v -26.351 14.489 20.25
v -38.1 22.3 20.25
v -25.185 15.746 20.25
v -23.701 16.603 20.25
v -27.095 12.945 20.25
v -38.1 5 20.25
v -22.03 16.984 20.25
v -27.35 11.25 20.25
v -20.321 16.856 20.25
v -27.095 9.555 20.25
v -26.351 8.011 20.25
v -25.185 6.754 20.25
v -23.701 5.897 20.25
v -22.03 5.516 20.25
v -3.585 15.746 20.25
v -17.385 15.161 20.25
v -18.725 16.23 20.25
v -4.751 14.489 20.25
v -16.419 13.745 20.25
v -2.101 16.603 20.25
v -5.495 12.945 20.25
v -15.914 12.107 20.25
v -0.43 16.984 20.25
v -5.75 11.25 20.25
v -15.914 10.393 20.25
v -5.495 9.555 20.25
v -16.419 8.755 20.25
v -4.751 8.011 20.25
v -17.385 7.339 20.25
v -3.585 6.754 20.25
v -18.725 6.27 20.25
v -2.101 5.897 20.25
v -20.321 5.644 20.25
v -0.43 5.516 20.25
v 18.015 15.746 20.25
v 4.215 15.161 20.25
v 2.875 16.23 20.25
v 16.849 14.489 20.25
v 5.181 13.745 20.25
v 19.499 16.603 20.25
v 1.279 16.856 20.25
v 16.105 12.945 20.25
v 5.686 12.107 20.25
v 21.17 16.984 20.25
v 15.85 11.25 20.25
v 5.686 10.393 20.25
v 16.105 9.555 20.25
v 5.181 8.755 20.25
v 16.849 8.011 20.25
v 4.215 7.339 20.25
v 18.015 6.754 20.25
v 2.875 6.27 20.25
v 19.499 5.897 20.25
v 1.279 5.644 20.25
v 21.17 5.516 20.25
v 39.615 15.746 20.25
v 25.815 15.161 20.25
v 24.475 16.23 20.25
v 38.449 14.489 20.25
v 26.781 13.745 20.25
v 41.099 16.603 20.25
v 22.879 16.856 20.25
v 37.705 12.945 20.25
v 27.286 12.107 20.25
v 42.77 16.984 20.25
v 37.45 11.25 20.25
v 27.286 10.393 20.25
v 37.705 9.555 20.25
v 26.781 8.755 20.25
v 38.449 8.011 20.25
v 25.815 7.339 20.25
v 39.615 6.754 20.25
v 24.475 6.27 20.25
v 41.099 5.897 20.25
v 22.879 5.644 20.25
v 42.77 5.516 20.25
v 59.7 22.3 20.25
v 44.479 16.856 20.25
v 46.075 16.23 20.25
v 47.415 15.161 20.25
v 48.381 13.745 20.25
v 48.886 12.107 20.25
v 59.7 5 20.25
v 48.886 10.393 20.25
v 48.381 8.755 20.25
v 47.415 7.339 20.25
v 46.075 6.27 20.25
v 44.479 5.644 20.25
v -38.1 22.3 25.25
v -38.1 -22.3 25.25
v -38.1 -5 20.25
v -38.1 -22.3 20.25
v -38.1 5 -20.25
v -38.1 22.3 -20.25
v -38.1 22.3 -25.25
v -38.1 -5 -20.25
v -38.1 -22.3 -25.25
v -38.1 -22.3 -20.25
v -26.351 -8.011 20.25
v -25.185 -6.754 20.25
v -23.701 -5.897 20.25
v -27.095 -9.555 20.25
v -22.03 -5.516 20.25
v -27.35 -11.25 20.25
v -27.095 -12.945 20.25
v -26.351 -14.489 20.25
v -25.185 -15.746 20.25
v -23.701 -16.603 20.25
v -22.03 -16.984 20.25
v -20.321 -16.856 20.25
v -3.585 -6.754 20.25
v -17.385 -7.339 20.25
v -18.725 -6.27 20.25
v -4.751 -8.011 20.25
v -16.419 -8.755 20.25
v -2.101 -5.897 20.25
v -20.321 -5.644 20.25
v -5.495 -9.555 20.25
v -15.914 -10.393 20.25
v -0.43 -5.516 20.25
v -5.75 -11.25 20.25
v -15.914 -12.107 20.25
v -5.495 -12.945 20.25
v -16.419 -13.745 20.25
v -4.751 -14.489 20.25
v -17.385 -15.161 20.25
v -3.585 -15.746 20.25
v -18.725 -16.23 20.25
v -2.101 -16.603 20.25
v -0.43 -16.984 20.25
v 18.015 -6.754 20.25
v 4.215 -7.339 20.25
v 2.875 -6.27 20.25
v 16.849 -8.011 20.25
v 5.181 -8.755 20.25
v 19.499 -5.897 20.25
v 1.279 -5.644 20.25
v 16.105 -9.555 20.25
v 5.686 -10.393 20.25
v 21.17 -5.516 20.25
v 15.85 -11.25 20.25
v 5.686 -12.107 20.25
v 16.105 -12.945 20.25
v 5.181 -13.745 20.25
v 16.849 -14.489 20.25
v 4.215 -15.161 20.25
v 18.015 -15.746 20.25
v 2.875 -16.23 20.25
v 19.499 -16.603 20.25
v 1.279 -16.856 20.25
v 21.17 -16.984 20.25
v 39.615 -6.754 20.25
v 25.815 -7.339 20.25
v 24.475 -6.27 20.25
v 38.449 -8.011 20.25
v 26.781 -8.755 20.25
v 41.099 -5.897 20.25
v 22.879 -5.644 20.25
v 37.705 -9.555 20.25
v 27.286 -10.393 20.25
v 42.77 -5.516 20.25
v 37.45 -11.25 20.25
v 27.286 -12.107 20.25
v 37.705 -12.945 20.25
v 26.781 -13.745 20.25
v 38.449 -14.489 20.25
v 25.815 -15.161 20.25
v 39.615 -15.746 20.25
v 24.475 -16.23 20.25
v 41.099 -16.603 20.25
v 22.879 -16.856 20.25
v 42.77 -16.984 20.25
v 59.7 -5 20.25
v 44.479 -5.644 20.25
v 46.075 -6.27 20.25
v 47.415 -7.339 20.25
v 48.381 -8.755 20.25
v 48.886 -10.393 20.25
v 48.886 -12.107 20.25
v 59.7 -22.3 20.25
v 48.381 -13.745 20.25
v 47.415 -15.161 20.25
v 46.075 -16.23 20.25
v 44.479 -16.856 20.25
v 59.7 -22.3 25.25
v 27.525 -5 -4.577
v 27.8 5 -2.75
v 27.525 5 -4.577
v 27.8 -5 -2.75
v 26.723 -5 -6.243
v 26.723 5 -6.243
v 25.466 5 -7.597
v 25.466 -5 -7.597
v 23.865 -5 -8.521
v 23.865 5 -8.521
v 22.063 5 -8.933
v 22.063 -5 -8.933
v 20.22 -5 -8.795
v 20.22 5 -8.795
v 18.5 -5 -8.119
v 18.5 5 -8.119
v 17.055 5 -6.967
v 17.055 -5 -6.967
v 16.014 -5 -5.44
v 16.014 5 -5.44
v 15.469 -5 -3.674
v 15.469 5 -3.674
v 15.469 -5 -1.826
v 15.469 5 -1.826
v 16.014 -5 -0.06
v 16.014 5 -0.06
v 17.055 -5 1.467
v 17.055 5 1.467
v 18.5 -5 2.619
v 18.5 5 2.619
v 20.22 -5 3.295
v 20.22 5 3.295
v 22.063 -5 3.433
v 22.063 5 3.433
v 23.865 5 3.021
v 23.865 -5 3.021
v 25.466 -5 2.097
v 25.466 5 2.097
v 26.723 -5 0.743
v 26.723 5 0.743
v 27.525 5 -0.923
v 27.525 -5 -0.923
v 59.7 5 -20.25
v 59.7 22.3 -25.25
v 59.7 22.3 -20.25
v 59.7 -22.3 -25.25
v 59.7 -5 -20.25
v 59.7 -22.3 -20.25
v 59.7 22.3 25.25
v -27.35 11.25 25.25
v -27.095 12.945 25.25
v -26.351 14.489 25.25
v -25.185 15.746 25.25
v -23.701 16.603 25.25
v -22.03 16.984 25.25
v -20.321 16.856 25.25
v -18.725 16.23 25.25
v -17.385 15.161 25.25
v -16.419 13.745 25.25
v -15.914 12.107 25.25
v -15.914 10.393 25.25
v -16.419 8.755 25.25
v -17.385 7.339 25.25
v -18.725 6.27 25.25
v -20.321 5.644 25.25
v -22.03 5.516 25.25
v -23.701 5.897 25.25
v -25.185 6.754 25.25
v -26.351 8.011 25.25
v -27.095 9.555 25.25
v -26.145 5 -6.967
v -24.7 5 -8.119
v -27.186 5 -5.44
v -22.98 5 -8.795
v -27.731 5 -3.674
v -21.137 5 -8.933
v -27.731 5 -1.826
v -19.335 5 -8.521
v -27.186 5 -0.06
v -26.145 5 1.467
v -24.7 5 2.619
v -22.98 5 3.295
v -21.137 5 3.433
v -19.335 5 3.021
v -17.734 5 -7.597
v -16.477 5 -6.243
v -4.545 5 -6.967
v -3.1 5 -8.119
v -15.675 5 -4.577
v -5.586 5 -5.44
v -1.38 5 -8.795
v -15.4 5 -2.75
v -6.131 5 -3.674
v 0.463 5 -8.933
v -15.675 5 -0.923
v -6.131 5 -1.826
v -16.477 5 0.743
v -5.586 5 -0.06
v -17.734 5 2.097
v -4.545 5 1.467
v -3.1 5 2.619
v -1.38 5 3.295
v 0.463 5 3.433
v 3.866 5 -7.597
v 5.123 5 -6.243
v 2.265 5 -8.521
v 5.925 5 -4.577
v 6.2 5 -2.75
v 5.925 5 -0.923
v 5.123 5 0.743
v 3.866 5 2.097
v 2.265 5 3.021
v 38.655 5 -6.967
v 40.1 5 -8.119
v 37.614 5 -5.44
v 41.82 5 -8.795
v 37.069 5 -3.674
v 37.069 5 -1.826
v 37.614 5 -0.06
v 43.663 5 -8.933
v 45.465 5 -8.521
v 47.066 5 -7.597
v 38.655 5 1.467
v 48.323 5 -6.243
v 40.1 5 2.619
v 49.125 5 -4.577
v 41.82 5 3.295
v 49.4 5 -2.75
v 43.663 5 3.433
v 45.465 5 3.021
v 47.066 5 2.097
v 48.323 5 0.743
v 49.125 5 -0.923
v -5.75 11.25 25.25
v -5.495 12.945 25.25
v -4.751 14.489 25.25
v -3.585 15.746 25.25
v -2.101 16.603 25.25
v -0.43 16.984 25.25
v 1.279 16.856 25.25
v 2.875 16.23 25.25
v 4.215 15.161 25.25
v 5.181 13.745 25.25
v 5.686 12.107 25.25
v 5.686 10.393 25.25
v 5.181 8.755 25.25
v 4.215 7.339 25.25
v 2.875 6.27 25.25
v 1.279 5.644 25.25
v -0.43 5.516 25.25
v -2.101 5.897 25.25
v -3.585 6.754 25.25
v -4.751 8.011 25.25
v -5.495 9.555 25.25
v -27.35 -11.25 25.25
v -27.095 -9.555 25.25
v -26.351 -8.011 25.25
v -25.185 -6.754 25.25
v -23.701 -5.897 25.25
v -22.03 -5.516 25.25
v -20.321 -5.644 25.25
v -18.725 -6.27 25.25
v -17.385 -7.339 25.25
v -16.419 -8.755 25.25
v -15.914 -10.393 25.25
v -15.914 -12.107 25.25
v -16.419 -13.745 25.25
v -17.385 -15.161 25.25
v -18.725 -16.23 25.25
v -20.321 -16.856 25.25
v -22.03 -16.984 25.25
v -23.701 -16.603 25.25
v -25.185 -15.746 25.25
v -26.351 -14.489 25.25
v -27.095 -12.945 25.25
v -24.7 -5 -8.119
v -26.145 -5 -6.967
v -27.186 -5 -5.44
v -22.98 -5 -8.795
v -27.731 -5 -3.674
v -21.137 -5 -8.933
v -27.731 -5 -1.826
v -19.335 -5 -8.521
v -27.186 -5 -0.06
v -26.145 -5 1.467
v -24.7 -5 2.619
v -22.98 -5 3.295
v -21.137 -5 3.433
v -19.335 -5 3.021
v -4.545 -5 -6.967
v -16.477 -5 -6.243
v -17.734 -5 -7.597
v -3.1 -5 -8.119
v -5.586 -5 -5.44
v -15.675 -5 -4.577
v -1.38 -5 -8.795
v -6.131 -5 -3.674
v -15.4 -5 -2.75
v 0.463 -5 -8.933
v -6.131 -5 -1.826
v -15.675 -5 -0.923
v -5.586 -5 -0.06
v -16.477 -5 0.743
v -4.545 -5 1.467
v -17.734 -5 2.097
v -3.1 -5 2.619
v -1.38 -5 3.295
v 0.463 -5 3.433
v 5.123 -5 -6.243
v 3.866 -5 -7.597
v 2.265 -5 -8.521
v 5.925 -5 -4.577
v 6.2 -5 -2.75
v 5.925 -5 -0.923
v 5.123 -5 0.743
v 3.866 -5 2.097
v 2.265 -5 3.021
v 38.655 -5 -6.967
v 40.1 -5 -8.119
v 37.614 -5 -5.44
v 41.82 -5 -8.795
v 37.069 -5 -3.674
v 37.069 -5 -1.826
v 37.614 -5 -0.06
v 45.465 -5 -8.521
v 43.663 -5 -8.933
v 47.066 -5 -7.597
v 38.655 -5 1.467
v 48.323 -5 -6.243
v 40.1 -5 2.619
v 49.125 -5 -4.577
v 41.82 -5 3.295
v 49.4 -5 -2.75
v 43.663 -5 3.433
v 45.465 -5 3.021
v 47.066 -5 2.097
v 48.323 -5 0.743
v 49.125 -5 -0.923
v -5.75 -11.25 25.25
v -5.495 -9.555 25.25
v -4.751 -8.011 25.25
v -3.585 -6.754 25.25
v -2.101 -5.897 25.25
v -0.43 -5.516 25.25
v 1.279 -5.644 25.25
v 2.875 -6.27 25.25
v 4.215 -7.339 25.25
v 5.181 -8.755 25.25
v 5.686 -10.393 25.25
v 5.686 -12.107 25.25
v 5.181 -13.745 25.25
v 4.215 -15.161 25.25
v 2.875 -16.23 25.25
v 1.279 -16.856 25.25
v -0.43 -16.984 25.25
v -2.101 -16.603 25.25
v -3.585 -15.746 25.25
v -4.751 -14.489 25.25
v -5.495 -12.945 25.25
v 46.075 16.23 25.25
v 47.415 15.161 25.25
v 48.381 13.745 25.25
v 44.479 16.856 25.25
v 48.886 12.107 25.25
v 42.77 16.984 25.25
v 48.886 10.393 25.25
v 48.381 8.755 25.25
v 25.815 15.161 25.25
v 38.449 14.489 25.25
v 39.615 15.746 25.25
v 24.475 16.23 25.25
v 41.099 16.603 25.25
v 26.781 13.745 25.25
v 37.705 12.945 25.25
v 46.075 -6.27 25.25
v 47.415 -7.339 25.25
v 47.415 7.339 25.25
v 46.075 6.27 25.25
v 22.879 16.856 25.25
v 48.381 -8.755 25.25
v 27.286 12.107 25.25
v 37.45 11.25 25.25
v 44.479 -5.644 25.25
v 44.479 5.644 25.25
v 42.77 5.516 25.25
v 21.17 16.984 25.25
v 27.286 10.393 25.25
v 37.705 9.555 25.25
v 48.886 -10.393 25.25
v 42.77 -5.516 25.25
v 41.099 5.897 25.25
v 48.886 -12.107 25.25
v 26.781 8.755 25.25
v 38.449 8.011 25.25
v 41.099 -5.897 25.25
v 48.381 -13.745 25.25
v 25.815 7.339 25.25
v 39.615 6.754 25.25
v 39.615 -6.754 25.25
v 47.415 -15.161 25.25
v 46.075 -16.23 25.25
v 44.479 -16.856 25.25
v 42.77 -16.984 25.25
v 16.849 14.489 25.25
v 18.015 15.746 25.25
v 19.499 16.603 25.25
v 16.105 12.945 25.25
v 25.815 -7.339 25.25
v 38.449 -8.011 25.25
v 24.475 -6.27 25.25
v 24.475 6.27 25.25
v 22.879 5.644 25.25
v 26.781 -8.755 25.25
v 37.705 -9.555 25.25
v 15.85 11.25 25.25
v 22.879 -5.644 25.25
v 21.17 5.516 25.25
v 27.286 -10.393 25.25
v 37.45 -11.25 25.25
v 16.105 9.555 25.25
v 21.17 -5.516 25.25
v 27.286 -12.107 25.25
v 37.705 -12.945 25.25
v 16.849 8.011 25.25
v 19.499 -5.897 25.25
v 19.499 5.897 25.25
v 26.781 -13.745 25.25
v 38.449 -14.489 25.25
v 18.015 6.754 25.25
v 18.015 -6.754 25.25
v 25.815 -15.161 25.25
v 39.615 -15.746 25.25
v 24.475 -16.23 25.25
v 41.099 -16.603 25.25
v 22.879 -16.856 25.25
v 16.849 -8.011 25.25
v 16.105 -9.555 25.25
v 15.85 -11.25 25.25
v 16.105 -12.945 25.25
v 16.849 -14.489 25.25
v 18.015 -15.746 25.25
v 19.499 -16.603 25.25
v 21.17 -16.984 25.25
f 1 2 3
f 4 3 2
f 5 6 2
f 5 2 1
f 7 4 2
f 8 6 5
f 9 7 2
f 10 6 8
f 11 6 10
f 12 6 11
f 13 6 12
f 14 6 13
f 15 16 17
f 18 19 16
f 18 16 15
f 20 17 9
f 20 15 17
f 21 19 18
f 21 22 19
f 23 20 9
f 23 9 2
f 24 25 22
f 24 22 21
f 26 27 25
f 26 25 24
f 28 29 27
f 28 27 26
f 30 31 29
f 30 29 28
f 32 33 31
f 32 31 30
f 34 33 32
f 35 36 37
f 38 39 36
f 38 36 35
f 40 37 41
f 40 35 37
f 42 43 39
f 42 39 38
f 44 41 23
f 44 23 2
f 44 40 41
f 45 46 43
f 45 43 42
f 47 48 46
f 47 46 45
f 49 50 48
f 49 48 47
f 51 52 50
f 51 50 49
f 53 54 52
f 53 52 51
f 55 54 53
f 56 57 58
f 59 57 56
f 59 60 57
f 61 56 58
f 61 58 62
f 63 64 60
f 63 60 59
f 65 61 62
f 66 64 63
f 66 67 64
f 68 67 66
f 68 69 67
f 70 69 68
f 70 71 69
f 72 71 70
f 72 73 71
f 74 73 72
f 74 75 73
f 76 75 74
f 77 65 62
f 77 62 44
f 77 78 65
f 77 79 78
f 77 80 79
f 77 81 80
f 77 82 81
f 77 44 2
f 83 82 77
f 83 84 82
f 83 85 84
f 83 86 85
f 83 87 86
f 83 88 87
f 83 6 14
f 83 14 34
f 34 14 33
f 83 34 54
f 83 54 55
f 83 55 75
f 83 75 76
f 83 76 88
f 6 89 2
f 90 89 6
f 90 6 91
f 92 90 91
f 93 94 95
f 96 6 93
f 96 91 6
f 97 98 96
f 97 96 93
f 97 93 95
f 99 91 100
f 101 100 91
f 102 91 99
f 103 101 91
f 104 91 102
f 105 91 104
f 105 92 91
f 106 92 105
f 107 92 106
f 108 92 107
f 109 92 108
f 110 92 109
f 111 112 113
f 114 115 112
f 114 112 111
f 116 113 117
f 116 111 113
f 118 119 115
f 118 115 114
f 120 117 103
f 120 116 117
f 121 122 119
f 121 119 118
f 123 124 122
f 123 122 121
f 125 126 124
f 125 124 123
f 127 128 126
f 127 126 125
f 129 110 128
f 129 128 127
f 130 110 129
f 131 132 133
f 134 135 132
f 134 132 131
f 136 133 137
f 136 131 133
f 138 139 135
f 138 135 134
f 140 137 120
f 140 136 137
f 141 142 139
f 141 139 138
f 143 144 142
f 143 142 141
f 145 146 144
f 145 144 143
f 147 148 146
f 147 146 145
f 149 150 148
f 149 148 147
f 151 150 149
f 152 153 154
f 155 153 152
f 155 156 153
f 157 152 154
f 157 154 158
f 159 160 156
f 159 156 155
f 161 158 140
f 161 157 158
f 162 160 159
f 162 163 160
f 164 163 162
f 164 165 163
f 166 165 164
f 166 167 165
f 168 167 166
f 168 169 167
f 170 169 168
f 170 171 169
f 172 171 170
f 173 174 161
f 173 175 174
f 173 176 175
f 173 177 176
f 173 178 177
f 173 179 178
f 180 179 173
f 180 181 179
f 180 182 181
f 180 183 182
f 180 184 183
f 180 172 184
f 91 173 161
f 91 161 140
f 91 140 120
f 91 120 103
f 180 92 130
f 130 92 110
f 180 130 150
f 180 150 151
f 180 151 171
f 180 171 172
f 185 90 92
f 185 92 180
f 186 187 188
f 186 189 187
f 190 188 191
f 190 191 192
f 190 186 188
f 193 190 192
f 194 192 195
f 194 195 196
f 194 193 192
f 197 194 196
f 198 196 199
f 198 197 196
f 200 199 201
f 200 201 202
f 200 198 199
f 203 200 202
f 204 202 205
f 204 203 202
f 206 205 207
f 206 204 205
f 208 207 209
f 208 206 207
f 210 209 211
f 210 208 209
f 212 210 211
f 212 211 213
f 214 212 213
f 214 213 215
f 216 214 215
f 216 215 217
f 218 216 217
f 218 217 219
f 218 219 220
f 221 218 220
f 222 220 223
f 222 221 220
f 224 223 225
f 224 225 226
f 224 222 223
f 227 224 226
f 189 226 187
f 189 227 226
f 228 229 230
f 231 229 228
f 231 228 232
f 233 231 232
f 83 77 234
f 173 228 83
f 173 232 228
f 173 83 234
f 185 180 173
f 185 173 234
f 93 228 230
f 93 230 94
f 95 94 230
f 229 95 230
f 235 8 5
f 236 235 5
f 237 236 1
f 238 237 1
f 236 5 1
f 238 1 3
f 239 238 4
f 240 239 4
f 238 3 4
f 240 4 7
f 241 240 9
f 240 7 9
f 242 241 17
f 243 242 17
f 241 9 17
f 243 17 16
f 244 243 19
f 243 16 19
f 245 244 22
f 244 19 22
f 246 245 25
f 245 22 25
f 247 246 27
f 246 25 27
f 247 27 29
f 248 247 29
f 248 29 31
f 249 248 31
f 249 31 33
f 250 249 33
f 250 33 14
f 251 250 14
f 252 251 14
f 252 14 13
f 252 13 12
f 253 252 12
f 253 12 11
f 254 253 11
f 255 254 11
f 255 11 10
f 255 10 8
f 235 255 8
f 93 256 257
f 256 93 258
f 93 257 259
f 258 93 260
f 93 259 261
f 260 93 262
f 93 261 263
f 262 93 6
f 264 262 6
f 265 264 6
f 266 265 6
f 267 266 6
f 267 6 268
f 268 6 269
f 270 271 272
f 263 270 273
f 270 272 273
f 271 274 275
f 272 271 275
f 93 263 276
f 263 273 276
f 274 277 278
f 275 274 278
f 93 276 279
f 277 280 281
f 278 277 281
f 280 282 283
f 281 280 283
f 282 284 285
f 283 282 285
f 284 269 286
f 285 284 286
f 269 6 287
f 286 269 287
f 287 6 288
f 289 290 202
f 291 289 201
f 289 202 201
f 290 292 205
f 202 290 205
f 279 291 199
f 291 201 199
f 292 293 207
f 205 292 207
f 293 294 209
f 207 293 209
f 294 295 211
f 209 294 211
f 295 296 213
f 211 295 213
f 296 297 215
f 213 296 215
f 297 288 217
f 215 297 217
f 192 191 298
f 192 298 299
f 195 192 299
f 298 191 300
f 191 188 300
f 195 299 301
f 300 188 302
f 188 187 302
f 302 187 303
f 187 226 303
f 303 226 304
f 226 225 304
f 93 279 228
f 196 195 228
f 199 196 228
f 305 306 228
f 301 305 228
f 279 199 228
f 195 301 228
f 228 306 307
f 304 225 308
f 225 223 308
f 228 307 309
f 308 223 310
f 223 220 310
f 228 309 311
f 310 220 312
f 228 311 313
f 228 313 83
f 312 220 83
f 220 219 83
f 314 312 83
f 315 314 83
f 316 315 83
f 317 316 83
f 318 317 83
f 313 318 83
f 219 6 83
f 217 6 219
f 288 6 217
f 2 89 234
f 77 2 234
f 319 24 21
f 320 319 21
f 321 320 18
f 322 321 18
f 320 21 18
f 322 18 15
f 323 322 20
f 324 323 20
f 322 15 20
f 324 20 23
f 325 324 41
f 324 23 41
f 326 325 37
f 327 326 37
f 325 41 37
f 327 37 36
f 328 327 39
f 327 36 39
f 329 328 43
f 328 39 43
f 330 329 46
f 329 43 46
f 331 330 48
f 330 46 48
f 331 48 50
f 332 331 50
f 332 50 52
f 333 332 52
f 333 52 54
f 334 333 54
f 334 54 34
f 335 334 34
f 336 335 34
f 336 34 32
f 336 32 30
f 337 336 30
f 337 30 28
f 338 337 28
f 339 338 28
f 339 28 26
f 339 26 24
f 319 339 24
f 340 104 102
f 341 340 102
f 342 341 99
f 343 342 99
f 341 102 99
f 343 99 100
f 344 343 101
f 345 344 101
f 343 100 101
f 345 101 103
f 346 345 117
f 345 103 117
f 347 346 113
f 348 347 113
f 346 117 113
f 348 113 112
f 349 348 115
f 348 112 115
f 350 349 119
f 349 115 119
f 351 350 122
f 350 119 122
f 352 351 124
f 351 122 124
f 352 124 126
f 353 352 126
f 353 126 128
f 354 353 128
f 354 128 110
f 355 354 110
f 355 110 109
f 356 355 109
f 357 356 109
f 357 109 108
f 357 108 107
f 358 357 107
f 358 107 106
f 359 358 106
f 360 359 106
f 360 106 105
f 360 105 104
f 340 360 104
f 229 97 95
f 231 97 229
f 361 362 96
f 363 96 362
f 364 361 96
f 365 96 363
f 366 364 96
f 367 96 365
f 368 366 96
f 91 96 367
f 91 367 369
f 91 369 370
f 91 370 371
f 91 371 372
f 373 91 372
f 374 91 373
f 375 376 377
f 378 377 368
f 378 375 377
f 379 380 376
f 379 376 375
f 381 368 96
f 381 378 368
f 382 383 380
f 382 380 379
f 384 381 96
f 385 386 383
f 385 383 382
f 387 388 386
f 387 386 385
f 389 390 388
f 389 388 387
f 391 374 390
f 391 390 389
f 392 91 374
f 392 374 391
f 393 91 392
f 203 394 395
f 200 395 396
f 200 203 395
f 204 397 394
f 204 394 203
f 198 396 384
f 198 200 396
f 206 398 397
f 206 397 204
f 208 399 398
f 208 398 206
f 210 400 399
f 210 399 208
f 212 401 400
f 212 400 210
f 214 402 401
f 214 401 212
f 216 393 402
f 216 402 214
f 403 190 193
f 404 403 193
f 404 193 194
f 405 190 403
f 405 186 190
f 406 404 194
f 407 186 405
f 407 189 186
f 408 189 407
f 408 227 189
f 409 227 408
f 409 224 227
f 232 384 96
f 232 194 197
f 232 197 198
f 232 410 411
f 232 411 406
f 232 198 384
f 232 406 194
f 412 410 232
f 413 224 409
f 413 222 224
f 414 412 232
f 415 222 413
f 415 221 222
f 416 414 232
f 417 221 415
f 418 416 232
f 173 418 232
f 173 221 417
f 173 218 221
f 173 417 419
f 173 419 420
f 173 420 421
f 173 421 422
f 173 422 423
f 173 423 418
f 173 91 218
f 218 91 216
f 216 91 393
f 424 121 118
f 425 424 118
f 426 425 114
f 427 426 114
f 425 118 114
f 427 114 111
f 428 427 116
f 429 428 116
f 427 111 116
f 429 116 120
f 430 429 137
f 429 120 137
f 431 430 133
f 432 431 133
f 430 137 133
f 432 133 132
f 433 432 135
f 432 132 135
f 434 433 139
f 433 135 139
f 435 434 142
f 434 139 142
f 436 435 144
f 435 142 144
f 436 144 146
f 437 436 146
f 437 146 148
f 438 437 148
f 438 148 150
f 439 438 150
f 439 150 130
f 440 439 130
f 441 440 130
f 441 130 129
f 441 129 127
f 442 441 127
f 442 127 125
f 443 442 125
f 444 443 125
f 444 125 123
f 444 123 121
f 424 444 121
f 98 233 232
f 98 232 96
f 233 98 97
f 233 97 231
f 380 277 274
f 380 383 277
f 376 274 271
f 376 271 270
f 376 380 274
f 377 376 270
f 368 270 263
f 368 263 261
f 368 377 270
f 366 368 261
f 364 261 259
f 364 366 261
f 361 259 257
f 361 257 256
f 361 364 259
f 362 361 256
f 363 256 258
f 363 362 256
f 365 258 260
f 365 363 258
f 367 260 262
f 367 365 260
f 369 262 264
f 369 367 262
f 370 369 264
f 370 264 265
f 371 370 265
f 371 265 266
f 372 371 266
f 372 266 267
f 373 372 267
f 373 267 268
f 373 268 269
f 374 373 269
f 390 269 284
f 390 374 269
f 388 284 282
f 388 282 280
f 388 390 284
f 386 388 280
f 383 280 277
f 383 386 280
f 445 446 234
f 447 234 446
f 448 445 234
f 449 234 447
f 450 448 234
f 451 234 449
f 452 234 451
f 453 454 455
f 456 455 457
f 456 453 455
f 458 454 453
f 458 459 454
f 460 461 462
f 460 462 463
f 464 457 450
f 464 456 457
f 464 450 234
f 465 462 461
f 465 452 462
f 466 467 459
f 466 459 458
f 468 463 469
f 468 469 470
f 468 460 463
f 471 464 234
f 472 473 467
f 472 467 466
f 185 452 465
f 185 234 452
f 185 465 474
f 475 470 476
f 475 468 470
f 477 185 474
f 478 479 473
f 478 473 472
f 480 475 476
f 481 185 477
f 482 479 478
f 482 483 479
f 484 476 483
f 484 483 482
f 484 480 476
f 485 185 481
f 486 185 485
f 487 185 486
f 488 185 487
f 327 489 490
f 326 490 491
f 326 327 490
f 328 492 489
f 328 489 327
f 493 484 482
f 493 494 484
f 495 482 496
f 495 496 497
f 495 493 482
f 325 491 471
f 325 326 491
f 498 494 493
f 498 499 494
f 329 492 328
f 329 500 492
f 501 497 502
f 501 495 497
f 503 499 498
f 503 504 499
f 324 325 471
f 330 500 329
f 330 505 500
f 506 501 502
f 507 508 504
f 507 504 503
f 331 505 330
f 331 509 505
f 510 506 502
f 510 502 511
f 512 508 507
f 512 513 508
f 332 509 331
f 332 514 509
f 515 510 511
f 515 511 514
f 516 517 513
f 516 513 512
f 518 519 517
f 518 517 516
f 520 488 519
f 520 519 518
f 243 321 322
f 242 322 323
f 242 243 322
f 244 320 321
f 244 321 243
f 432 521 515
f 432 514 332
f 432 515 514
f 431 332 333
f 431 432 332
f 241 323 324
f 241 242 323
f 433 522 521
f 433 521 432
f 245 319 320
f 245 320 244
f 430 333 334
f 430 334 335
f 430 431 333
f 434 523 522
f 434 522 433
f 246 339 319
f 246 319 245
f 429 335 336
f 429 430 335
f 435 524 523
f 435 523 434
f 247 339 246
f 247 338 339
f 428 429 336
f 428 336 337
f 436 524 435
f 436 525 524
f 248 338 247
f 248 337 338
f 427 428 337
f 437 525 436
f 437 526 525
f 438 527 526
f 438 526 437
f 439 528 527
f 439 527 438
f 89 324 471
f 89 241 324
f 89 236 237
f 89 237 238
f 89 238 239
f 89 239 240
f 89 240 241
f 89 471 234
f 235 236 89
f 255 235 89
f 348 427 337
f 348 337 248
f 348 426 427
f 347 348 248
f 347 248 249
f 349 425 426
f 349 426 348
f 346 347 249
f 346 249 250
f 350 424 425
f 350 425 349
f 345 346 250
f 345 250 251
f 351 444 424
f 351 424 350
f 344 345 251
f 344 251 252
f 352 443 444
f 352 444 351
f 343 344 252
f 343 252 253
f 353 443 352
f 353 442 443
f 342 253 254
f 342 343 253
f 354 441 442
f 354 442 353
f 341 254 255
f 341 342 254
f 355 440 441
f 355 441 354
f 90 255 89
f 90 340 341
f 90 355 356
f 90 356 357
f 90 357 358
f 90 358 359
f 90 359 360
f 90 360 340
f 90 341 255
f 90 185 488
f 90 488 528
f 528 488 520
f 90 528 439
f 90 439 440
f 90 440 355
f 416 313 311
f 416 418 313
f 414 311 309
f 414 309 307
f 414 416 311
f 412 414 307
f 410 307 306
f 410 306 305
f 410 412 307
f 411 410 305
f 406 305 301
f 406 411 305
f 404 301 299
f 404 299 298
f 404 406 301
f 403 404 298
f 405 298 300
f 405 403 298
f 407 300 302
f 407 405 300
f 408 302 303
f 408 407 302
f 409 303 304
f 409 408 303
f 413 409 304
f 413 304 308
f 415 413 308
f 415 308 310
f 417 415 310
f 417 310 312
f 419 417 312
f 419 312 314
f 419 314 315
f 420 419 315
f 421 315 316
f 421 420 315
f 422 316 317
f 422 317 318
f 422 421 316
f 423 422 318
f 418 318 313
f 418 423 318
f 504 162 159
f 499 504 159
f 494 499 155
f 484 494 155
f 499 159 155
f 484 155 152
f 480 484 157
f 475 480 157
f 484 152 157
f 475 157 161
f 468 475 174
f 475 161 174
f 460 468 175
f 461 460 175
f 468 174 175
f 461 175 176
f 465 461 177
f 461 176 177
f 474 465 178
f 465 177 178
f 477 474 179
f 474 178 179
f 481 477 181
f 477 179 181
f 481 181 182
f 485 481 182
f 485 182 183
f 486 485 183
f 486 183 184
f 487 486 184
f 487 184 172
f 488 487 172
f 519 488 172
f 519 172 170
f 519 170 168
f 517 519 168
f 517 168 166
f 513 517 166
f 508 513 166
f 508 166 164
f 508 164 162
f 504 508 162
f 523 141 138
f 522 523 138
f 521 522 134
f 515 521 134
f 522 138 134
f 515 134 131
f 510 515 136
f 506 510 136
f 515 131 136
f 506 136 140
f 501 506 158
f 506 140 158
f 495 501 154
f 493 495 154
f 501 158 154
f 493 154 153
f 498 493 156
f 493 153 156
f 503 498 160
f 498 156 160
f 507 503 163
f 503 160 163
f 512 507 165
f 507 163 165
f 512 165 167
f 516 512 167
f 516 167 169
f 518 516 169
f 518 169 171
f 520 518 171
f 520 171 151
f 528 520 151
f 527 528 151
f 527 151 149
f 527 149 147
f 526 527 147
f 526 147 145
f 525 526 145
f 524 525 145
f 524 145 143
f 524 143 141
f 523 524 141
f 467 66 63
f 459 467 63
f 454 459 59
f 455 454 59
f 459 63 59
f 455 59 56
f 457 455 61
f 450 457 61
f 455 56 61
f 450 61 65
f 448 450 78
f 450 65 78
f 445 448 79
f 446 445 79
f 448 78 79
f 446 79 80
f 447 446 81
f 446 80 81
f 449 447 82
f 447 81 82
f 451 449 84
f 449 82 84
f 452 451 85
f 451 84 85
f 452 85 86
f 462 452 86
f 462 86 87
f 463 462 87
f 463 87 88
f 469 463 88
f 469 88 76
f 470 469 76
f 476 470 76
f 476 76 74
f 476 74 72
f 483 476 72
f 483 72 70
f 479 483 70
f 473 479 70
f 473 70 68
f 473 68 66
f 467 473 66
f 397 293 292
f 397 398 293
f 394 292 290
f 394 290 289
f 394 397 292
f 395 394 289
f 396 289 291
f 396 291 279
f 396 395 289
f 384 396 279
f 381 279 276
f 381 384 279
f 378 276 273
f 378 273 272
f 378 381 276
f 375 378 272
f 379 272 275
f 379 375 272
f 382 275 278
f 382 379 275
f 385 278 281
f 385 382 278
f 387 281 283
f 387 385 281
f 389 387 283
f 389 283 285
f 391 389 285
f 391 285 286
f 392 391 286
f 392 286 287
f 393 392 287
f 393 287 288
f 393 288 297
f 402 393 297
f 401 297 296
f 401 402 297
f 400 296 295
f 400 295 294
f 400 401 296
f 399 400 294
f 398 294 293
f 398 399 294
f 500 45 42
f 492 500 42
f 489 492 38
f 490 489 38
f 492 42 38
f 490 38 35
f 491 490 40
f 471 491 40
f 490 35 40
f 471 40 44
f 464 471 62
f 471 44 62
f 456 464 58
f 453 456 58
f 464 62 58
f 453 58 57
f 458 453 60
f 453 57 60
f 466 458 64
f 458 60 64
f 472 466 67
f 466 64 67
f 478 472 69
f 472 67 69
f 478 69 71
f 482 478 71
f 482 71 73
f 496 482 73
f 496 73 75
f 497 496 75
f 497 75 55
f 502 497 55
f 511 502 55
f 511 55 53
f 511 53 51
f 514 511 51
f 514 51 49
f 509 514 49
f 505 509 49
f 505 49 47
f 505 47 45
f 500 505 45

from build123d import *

# Parameters (mm, degrees)
F1_DEPTH = 22.3
F3_D     = 11.5
F4_DEPTH = 5
F5_DEPTH = 22.3


with BuildPart() as f1:
    # F0 (on Front) → F1 (new body, symmetric)
    with BuildSketch(Plane.XZ):
        Polygon((59.7, 25.25), (38.1, 25.25), (-38.1, 25.25), (-38.1, 20.25), (38.1, 20.25), (59.7, 20.25), align=None)
    extrude(amount=F1_DEPTH, both=True)

    # F3 (through all)
    with Locations(Plane.XY.offset(25.25)):
        with Locations((-21.6, 11.25), (0, 11.25), (21.6, 11.25), (21.6, -11.25), (0, -11.25), (-21.6, -11.25), (43.2, 11.25), (43.2, -11.25)):
            Hole(F3_D / 2)

    # F0 (on Front) → F4 (join, symmetric)
    with BuildSketch(Plane.XZ):
        with BuildLine():
            Line((38.1, 20.25), (-38.1, 20.25))
            Line((-38.1, 20.25), (-38.1, -2.75))
            Line((-38.1, -2.75), (-27.8, -2.75))
            ThreePointArc((-27.8, -2.75), (-21.6, 3.45), (-15.4, -2.75))
            Line((-15.4, -2.75), (-6.2, -2.75))
            ThreePointArc((-6.2, -2.75), (0, 3.45), (6.2, -2.75))
            Line((6.2, -2.75), (15.4, -2.75))
            ThreePointArc((15.4, -2.75), (21.6, 3.45), (27.8, -2.75))
            Line((27.8, -2.75), (37, -2.75))
            ThreePointArc((37, -2.75), (43.2, 3.45), (49.4, -2.75))
            Line((49.4, -2.75), (59.7, -2.75))
            Line((59.7, -2.75), (59.7, 20.25))
            Line((59.7, 20.25), (38.1, 20.25))
        make_face()
        with BuildLine():
            Line((-27.8, -2.75), (-38.1, -2.75))
            Line((-38.1, -2.75), (-38.1, -20.25))
            Line((-38.1, -20.25), (38.1, -20.25))
            Line((38.1, -20.25), (59.7, -20.25))
            Line((59.7, -20.25), (59.7, -2.75))
            Line((59.7, -2.75), (49.4, -2.75))
            ThreePointArc((49.4, -2.75), (43.2, -8.95), (37, -2.75))
            Line((37, -2.75), (27.8, -2.75))
            ThreePointArc((27.8, -2.75), (21.6, -8.95), (15.4, -2.75))
            Line((15.4, -2.75), (6.2, -2.75))
            ThreePointArc((6.2, -2.75), (0, -8.95), (-6.2, -2.75))
            Line((-6.2, -2.75), (-15.4, -2.75))
            ThreePointArc((-15.4, -2.75), (-21.6, -8.95), (-27.8, -2.75))
        make_face()
    extrude(amount=F4_DEPTH, both=True)

    # F0 (on Front) → F5 (join, symmetric)
    with BuildSketch(Plane.XZ):
        Polygon((38.1, -20.25), (-38.1, -20.25), (-38.1, -25.25), (38.1, -25.25), (59.7, -25.25), (59.7, -20.25), align=None)
    extrude(amount=F5_DEPTH, both=True)


solid = f1.part
